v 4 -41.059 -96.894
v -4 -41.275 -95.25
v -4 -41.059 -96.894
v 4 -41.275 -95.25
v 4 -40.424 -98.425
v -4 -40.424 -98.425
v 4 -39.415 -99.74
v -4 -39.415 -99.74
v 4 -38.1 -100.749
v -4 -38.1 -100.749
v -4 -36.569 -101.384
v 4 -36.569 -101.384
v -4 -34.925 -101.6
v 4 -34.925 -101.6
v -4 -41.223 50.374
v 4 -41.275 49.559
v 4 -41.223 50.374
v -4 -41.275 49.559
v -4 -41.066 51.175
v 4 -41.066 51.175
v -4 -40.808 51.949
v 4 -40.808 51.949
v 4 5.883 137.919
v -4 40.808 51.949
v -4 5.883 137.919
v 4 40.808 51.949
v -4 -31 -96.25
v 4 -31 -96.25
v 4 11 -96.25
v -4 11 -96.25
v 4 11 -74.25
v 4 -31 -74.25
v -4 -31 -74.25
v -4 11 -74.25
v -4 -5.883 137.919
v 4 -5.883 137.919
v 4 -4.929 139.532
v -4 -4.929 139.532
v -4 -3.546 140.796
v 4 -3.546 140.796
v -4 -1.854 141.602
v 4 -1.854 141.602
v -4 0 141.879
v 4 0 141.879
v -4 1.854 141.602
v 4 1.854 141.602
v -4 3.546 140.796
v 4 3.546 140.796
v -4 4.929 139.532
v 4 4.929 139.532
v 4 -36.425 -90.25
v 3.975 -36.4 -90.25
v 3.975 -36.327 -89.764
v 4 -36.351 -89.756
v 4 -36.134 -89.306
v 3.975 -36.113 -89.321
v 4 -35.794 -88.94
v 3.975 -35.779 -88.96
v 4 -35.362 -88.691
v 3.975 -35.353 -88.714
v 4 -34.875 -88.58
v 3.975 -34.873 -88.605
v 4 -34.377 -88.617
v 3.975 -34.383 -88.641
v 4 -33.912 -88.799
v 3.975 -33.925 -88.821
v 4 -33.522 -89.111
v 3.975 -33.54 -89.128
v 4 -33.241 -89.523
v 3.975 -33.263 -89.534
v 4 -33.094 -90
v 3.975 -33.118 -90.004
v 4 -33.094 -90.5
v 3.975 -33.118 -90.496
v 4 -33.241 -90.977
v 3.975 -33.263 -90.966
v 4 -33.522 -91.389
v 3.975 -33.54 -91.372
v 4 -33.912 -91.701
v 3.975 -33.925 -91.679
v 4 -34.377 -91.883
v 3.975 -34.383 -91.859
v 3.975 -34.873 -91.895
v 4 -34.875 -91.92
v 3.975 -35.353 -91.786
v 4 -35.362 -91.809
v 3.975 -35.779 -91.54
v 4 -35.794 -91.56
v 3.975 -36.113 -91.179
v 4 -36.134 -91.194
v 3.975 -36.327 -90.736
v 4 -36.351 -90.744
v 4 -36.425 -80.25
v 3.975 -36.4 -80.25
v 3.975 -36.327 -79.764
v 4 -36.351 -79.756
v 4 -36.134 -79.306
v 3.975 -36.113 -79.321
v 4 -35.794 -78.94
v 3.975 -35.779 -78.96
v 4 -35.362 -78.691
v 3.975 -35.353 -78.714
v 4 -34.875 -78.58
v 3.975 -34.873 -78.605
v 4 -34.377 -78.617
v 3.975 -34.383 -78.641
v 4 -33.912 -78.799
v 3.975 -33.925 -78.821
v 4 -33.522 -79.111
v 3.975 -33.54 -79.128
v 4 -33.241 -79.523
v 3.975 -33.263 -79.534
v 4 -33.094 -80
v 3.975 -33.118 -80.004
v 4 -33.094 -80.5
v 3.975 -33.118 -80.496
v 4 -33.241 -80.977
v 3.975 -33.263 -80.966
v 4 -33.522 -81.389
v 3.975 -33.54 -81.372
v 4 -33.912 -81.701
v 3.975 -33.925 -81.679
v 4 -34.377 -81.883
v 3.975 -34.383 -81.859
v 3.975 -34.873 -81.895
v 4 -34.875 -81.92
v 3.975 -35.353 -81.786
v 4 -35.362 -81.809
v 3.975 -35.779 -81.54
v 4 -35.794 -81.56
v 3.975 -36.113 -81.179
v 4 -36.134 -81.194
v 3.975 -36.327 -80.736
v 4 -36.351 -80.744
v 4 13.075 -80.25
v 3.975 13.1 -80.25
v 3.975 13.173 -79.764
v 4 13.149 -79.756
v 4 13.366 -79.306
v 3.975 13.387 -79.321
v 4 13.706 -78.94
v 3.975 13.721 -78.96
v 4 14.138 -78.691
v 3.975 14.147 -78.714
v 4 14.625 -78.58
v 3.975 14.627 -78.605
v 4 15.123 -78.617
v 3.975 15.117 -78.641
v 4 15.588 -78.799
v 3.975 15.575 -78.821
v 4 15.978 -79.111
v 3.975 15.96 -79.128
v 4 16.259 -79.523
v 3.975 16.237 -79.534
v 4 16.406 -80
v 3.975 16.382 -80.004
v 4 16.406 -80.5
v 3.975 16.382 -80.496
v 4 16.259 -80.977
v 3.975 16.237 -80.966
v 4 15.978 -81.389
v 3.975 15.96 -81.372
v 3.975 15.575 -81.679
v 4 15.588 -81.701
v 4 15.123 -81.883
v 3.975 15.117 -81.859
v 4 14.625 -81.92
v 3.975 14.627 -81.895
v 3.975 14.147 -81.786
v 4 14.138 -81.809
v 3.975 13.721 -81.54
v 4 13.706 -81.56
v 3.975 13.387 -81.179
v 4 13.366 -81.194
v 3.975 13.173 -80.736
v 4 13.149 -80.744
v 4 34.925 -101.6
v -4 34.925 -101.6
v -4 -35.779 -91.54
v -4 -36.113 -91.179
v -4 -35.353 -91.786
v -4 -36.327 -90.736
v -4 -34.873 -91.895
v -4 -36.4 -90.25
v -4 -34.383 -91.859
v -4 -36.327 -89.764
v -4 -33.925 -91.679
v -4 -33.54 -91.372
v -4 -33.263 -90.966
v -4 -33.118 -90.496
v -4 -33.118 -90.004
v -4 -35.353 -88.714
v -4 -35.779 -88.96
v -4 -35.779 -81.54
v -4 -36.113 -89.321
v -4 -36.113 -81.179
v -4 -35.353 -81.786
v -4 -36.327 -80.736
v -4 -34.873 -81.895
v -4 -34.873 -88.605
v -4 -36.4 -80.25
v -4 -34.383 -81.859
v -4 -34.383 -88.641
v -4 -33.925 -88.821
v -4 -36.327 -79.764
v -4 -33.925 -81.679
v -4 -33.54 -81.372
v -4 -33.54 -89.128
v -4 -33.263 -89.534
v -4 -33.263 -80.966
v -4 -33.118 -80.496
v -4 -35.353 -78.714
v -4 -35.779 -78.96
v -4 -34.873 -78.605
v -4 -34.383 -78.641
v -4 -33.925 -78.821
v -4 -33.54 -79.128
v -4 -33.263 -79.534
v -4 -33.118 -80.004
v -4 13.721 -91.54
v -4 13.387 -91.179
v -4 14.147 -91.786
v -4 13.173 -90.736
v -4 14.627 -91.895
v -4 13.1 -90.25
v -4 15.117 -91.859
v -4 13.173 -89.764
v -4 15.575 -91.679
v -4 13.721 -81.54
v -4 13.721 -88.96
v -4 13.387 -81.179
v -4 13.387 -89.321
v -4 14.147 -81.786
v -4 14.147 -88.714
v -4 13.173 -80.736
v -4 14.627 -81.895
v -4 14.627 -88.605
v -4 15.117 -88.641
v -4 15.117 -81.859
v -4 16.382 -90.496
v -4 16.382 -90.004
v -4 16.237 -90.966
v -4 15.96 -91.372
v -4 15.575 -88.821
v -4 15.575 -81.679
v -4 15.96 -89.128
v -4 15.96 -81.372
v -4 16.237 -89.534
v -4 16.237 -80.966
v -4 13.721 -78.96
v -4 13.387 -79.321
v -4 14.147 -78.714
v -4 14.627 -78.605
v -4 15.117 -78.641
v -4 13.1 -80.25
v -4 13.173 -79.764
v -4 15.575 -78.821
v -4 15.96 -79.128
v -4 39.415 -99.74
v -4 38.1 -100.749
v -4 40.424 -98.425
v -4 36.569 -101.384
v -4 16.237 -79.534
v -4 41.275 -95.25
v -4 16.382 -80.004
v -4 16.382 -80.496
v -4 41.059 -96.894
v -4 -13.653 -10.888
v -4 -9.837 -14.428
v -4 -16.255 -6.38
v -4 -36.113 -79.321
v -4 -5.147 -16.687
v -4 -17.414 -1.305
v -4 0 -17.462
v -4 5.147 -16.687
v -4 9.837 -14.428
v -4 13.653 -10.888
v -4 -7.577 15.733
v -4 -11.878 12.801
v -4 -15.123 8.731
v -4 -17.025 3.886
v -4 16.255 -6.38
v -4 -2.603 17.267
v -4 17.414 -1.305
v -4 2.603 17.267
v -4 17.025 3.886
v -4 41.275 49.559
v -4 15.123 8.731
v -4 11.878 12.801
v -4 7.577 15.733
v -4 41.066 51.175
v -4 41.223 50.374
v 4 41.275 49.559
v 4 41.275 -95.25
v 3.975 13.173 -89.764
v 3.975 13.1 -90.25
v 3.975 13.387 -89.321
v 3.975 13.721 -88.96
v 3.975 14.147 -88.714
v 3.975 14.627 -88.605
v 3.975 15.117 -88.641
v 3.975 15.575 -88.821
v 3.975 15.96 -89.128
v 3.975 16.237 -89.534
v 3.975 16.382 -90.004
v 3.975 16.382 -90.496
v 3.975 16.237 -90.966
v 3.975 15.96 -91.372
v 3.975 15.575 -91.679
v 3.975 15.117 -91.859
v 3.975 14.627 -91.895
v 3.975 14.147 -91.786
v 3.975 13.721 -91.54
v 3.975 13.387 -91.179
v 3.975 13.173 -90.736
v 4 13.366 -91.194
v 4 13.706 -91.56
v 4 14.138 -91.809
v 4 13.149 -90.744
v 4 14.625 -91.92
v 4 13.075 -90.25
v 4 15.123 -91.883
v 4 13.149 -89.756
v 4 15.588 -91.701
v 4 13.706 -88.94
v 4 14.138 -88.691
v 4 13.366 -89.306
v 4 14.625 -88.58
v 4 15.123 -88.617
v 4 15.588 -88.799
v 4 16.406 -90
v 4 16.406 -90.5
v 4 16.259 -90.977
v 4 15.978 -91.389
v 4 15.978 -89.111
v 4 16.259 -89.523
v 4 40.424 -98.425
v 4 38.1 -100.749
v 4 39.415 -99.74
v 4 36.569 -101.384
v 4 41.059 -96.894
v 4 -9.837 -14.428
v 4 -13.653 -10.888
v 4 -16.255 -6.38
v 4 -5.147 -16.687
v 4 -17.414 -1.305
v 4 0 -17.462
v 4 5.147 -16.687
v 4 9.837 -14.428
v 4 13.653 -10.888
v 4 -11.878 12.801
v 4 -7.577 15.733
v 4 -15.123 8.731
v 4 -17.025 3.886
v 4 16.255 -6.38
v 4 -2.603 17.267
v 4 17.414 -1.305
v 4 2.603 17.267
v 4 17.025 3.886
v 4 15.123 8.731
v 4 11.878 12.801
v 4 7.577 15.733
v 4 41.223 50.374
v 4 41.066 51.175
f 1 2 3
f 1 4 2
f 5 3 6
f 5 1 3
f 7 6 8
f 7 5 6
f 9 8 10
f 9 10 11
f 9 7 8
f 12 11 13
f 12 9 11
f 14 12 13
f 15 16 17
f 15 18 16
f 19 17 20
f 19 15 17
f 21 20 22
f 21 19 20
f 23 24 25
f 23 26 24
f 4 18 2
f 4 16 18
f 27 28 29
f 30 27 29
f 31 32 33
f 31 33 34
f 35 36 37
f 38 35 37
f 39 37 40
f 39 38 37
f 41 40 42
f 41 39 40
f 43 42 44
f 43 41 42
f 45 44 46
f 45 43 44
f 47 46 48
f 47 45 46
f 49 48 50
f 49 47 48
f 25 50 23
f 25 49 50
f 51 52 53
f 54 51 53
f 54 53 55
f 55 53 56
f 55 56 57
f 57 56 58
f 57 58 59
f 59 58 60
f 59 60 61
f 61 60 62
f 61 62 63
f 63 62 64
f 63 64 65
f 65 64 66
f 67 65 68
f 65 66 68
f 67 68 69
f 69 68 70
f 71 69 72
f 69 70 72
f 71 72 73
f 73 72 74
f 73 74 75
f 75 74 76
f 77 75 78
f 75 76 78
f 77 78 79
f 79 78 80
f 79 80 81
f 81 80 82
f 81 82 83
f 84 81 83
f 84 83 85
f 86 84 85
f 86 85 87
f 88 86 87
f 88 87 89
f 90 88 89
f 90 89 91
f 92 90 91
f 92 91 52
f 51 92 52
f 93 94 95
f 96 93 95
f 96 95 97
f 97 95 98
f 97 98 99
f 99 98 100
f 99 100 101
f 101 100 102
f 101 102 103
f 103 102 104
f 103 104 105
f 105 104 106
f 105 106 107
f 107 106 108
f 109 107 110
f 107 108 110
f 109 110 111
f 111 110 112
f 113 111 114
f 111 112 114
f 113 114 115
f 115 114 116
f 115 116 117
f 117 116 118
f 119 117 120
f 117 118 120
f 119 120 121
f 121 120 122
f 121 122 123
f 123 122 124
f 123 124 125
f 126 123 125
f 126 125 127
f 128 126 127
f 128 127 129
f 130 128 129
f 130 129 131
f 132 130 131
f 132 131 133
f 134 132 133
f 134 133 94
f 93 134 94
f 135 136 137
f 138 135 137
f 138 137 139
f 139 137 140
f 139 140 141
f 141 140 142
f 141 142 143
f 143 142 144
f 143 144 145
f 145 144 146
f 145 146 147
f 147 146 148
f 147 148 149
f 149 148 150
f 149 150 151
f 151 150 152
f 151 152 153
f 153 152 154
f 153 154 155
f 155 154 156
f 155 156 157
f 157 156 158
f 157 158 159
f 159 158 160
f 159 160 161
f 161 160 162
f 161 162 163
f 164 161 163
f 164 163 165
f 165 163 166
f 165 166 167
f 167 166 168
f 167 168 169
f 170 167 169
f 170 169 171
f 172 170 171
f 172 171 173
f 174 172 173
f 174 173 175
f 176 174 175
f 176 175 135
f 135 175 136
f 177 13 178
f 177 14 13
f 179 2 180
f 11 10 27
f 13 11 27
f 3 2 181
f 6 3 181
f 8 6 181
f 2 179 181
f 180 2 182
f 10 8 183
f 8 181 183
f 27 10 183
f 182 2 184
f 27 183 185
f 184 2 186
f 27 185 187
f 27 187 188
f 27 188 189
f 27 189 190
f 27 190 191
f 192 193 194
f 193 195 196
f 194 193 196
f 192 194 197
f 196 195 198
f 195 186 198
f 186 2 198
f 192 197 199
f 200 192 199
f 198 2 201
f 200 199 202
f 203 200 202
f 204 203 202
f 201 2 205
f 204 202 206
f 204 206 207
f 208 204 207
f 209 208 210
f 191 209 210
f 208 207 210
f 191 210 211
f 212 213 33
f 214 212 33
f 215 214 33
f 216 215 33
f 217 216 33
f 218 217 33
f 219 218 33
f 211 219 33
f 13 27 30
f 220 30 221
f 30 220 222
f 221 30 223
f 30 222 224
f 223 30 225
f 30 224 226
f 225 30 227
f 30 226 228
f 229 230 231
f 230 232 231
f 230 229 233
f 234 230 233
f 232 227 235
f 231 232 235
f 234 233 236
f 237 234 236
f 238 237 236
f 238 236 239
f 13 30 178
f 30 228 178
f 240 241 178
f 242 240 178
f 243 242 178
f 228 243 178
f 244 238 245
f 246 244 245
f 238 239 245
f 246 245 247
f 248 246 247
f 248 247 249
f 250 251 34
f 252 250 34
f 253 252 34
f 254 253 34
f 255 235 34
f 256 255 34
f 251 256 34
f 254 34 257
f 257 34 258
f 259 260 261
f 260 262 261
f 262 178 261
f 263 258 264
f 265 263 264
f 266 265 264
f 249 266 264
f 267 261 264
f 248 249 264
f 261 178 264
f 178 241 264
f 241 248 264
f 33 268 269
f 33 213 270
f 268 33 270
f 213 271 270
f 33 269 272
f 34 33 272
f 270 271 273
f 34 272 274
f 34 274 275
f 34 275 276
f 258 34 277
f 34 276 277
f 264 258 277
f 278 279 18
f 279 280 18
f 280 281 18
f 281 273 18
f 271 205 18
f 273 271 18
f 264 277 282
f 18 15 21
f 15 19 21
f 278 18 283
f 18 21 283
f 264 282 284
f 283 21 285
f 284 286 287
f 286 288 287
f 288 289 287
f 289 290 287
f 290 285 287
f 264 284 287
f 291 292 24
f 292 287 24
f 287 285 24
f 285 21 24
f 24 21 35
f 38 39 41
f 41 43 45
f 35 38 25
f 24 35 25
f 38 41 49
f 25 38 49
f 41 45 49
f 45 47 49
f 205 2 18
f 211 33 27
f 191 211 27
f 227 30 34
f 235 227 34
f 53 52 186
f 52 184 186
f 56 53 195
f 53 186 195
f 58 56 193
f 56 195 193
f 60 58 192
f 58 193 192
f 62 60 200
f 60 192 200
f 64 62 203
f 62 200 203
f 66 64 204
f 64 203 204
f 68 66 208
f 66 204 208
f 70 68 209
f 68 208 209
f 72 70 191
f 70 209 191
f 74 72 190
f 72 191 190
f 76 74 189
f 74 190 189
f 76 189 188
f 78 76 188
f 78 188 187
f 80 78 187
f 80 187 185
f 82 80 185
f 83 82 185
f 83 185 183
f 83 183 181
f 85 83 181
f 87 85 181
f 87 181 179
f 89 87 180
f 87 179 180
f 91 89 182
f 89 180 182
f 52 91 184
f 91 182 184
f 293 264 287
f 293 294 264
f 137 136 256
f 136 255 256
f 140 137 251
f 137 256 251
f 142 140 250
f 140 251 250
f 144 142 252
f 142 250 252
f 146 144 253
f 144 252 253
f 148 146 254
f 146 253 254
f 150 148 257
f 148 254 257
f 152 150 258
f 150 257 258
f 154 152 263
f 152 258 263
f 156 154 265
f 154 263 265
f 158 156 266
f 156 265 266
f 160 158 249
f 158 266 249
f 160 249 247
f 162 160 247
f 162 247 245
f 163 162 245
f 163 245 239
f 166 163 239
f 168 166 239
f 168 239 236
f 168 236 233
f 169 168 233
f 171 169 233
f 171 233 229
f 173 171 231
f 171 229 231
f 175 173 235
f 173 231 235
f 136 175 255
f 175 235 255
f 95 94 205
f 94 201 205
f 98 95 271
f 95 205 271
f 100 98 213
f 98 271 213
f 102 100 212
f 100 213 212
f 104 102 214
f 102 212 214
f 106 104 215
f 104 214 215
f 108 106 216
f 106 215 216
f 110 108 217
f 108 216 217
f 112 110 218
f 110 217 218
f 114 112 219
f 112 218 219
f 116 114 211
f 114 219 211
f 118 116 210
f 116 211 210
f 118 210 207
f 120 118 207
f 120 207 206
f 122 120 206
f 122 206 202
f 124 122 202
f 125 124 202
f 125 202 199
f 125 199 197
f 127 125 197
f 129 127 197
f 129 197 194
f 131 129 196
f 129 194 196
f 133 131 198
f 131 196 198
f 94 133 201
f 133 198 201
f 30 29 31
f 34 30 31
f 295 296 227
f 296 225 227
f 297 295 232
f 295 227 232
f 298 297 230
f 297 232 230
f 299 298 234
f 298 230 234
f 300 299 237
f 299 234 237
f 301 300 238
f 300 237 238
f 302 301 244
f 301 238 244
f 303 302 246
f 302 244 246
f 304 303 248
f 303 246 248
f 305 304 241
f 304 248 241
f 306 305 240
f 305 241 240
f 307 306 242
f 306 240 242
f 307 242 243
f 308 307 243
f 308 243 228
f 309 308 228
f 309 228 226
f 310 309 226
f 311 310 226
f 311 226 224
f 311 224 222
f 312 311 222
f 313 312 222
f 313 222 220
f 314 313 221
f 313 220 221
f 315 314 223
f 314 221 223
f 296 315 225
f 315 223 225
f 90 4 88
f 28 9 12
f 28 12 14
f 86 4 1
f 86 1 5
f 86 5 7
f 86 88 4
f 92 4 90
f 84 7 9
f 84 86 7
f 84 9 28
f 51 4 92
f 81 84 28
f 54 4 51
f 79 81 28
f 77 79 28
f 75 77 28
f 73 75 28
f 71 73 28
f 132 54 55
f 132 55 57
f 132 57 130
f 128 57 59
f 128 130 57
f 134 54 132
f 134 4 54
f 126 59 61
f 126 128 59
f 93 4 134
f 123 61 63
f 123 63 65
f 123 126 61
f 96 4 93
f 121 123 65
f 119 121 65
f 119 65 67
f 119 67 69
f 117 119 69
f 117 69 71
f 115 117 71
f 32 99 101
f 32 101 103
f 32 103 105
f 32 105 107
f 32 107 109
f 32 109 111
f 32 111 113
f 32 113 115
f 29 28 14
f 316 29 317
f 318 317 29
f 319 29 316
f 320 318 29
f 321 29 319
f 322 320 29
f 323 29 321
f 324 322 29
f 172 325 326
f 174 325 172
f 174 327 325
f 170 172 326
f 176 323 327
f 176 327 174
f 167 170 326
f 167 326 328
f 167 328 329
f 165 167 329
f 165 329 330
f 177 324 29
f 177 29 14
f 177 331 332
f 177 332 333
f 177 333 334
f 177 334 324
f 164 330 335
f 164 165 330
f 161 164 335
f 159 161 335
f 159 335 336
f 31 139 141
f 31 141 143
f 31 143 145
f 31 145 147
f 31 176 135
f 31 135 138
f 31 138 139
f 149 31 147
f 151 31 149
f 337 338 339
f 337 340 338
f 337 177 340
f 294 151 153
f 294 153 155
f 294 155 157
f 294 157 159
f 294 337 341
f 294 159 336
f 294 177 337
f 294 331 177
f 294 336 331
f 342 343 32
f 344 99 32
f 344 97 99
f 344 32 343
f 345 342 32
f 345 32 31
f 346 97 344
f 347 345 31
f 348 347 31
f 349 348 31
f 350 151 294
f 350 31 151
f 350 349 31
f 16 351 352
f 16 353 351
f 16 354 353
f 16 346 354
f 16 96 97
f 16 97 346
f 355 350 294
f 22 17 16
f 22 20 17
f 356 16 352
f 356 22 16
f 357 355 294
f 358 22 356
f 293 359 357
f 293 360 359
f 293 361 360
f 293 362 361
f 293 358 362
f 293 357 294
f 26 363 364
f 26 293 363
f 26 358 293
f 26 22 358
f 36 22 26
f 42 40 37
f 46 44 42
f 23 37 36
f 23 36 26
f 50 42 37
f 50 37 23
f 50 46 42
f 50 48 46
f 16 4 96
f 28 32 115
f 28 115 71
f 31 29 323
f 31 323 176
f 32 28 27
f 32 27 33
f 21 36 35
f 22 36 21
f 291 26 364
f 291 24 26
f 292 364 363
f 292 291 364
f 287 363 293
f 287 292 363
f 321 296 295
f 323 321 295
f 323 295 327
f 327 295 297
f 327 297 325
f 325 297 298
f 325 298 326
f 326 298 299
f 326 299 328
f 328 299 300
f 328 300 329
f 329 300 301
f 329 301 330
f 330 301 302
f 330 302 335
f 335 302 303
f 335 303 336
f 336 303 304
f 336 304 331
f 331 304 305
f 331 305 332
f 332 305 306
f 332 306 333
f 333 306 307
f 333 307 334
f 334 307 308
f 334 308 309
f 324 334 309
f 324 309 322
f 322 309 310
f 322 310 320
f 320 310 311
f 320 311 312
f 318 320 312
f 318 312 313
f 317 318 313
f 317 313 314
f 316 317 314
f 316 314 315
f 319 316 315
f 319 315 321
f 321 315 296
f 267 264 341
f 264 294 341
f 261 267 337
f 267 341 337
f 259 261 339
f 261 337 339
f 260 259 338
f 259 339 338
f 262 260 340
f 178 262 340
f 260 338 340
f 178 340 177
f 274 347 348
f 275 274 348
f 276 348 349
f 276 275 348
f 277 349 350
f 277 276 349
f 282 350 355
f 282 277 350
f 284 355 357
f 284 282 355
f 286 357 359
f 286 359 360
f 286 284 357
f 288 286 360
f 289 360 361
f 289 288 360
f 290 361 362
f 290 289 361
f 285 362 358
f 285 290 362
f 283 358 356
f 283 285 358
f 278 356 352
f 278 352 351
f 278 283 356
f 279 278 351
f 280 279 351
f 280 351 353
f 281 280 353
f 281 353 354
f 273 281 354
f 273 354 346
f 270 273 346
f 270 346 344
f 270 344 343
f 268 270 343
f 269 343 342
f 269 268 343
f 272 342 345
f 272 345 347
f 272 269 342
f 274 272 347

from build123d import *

# Parameters (mm, degrees)
SKETCH1_R                             = 17.4625
BOSS_EXTRUDE2_DEPTH                   = 4.0005
FILLET1_R                             = 6.35
TAP_DRILL_FOR_M4X0_7_TAP1_D           = 3.3
TAP_DRILL_FOR_M4X0_7_TAP1_CSINK_D     = 3.35
TAP_DRILL_FOR_M4X0_7_TAP1_CSINK_ANGLE = 90
SKETCH5_W                             = 42
SKETCH5_H                             = 22
CUT_EXTRUDE1_DEPTH                    = 148.97697313


with BuildPart() as part:
    # Sketch1 → Boss-Extrude2 (new, symmetric)
    with BuildSketch(Plane.YZ):
        Polygon((-41.275, 50.8), (-41.275, -101.6), (41.275, -101.6), (41.275, 50.8), (0, 152.4), align=None)
        with Locations(Location((0, 0, 0), (0, 0, 270))):
            Circle(SKETCH1_R, mode=Mode.SUBTRACT)
    extrude(amount=BOSS_EXTRUDE2_DEPTH, both=True)

    # Fillet1
    fillet1_edges = [part.edges().sort_by_distance(p)[0] for p in [
        (0, 0, 152.4),
        (0, 41.275, 50.8),
        (0, 41.275, -101.6),
        (0, -41.275, -101.6),
        (0, -41.275, 50.8),
    ]]
    fillet(fillet1_edges, radius=FILLET1_R)

    # Tap Drill for M4x0.7 Tap1 (through all)
    with Locations(Plane.YZ.offset(4.0005)):
        with Locations((-34.75, -80.25), (-34.75, -90.25), (14.75, -80.25), (14.75, -90.25)):
            CounterSinkHole(TAP_DRILL_FOR_M4X0_7_TAP1_D / 2, TAP_DRILL_FOR_M4X0_7_TAP1_CSINK_D / 2, counter_sink_angle=TAP_DRILL_FOR_M4X0_7_TAP1_CSINK_ANGLE)

    # Sketch5 → Cut-Extrude1 (cut, through all)
    with BuildSketch(Plane.YZ.offset(4.0005)):
        with Locations((-10, -85.25)):
            Rectangle(SKETCH5_W, SKETCH5_H)
    extrude(amount=-CUT_EXTRUDE1_DEPTH, mode=Mode.SUBTRACT)


solid = part.part
